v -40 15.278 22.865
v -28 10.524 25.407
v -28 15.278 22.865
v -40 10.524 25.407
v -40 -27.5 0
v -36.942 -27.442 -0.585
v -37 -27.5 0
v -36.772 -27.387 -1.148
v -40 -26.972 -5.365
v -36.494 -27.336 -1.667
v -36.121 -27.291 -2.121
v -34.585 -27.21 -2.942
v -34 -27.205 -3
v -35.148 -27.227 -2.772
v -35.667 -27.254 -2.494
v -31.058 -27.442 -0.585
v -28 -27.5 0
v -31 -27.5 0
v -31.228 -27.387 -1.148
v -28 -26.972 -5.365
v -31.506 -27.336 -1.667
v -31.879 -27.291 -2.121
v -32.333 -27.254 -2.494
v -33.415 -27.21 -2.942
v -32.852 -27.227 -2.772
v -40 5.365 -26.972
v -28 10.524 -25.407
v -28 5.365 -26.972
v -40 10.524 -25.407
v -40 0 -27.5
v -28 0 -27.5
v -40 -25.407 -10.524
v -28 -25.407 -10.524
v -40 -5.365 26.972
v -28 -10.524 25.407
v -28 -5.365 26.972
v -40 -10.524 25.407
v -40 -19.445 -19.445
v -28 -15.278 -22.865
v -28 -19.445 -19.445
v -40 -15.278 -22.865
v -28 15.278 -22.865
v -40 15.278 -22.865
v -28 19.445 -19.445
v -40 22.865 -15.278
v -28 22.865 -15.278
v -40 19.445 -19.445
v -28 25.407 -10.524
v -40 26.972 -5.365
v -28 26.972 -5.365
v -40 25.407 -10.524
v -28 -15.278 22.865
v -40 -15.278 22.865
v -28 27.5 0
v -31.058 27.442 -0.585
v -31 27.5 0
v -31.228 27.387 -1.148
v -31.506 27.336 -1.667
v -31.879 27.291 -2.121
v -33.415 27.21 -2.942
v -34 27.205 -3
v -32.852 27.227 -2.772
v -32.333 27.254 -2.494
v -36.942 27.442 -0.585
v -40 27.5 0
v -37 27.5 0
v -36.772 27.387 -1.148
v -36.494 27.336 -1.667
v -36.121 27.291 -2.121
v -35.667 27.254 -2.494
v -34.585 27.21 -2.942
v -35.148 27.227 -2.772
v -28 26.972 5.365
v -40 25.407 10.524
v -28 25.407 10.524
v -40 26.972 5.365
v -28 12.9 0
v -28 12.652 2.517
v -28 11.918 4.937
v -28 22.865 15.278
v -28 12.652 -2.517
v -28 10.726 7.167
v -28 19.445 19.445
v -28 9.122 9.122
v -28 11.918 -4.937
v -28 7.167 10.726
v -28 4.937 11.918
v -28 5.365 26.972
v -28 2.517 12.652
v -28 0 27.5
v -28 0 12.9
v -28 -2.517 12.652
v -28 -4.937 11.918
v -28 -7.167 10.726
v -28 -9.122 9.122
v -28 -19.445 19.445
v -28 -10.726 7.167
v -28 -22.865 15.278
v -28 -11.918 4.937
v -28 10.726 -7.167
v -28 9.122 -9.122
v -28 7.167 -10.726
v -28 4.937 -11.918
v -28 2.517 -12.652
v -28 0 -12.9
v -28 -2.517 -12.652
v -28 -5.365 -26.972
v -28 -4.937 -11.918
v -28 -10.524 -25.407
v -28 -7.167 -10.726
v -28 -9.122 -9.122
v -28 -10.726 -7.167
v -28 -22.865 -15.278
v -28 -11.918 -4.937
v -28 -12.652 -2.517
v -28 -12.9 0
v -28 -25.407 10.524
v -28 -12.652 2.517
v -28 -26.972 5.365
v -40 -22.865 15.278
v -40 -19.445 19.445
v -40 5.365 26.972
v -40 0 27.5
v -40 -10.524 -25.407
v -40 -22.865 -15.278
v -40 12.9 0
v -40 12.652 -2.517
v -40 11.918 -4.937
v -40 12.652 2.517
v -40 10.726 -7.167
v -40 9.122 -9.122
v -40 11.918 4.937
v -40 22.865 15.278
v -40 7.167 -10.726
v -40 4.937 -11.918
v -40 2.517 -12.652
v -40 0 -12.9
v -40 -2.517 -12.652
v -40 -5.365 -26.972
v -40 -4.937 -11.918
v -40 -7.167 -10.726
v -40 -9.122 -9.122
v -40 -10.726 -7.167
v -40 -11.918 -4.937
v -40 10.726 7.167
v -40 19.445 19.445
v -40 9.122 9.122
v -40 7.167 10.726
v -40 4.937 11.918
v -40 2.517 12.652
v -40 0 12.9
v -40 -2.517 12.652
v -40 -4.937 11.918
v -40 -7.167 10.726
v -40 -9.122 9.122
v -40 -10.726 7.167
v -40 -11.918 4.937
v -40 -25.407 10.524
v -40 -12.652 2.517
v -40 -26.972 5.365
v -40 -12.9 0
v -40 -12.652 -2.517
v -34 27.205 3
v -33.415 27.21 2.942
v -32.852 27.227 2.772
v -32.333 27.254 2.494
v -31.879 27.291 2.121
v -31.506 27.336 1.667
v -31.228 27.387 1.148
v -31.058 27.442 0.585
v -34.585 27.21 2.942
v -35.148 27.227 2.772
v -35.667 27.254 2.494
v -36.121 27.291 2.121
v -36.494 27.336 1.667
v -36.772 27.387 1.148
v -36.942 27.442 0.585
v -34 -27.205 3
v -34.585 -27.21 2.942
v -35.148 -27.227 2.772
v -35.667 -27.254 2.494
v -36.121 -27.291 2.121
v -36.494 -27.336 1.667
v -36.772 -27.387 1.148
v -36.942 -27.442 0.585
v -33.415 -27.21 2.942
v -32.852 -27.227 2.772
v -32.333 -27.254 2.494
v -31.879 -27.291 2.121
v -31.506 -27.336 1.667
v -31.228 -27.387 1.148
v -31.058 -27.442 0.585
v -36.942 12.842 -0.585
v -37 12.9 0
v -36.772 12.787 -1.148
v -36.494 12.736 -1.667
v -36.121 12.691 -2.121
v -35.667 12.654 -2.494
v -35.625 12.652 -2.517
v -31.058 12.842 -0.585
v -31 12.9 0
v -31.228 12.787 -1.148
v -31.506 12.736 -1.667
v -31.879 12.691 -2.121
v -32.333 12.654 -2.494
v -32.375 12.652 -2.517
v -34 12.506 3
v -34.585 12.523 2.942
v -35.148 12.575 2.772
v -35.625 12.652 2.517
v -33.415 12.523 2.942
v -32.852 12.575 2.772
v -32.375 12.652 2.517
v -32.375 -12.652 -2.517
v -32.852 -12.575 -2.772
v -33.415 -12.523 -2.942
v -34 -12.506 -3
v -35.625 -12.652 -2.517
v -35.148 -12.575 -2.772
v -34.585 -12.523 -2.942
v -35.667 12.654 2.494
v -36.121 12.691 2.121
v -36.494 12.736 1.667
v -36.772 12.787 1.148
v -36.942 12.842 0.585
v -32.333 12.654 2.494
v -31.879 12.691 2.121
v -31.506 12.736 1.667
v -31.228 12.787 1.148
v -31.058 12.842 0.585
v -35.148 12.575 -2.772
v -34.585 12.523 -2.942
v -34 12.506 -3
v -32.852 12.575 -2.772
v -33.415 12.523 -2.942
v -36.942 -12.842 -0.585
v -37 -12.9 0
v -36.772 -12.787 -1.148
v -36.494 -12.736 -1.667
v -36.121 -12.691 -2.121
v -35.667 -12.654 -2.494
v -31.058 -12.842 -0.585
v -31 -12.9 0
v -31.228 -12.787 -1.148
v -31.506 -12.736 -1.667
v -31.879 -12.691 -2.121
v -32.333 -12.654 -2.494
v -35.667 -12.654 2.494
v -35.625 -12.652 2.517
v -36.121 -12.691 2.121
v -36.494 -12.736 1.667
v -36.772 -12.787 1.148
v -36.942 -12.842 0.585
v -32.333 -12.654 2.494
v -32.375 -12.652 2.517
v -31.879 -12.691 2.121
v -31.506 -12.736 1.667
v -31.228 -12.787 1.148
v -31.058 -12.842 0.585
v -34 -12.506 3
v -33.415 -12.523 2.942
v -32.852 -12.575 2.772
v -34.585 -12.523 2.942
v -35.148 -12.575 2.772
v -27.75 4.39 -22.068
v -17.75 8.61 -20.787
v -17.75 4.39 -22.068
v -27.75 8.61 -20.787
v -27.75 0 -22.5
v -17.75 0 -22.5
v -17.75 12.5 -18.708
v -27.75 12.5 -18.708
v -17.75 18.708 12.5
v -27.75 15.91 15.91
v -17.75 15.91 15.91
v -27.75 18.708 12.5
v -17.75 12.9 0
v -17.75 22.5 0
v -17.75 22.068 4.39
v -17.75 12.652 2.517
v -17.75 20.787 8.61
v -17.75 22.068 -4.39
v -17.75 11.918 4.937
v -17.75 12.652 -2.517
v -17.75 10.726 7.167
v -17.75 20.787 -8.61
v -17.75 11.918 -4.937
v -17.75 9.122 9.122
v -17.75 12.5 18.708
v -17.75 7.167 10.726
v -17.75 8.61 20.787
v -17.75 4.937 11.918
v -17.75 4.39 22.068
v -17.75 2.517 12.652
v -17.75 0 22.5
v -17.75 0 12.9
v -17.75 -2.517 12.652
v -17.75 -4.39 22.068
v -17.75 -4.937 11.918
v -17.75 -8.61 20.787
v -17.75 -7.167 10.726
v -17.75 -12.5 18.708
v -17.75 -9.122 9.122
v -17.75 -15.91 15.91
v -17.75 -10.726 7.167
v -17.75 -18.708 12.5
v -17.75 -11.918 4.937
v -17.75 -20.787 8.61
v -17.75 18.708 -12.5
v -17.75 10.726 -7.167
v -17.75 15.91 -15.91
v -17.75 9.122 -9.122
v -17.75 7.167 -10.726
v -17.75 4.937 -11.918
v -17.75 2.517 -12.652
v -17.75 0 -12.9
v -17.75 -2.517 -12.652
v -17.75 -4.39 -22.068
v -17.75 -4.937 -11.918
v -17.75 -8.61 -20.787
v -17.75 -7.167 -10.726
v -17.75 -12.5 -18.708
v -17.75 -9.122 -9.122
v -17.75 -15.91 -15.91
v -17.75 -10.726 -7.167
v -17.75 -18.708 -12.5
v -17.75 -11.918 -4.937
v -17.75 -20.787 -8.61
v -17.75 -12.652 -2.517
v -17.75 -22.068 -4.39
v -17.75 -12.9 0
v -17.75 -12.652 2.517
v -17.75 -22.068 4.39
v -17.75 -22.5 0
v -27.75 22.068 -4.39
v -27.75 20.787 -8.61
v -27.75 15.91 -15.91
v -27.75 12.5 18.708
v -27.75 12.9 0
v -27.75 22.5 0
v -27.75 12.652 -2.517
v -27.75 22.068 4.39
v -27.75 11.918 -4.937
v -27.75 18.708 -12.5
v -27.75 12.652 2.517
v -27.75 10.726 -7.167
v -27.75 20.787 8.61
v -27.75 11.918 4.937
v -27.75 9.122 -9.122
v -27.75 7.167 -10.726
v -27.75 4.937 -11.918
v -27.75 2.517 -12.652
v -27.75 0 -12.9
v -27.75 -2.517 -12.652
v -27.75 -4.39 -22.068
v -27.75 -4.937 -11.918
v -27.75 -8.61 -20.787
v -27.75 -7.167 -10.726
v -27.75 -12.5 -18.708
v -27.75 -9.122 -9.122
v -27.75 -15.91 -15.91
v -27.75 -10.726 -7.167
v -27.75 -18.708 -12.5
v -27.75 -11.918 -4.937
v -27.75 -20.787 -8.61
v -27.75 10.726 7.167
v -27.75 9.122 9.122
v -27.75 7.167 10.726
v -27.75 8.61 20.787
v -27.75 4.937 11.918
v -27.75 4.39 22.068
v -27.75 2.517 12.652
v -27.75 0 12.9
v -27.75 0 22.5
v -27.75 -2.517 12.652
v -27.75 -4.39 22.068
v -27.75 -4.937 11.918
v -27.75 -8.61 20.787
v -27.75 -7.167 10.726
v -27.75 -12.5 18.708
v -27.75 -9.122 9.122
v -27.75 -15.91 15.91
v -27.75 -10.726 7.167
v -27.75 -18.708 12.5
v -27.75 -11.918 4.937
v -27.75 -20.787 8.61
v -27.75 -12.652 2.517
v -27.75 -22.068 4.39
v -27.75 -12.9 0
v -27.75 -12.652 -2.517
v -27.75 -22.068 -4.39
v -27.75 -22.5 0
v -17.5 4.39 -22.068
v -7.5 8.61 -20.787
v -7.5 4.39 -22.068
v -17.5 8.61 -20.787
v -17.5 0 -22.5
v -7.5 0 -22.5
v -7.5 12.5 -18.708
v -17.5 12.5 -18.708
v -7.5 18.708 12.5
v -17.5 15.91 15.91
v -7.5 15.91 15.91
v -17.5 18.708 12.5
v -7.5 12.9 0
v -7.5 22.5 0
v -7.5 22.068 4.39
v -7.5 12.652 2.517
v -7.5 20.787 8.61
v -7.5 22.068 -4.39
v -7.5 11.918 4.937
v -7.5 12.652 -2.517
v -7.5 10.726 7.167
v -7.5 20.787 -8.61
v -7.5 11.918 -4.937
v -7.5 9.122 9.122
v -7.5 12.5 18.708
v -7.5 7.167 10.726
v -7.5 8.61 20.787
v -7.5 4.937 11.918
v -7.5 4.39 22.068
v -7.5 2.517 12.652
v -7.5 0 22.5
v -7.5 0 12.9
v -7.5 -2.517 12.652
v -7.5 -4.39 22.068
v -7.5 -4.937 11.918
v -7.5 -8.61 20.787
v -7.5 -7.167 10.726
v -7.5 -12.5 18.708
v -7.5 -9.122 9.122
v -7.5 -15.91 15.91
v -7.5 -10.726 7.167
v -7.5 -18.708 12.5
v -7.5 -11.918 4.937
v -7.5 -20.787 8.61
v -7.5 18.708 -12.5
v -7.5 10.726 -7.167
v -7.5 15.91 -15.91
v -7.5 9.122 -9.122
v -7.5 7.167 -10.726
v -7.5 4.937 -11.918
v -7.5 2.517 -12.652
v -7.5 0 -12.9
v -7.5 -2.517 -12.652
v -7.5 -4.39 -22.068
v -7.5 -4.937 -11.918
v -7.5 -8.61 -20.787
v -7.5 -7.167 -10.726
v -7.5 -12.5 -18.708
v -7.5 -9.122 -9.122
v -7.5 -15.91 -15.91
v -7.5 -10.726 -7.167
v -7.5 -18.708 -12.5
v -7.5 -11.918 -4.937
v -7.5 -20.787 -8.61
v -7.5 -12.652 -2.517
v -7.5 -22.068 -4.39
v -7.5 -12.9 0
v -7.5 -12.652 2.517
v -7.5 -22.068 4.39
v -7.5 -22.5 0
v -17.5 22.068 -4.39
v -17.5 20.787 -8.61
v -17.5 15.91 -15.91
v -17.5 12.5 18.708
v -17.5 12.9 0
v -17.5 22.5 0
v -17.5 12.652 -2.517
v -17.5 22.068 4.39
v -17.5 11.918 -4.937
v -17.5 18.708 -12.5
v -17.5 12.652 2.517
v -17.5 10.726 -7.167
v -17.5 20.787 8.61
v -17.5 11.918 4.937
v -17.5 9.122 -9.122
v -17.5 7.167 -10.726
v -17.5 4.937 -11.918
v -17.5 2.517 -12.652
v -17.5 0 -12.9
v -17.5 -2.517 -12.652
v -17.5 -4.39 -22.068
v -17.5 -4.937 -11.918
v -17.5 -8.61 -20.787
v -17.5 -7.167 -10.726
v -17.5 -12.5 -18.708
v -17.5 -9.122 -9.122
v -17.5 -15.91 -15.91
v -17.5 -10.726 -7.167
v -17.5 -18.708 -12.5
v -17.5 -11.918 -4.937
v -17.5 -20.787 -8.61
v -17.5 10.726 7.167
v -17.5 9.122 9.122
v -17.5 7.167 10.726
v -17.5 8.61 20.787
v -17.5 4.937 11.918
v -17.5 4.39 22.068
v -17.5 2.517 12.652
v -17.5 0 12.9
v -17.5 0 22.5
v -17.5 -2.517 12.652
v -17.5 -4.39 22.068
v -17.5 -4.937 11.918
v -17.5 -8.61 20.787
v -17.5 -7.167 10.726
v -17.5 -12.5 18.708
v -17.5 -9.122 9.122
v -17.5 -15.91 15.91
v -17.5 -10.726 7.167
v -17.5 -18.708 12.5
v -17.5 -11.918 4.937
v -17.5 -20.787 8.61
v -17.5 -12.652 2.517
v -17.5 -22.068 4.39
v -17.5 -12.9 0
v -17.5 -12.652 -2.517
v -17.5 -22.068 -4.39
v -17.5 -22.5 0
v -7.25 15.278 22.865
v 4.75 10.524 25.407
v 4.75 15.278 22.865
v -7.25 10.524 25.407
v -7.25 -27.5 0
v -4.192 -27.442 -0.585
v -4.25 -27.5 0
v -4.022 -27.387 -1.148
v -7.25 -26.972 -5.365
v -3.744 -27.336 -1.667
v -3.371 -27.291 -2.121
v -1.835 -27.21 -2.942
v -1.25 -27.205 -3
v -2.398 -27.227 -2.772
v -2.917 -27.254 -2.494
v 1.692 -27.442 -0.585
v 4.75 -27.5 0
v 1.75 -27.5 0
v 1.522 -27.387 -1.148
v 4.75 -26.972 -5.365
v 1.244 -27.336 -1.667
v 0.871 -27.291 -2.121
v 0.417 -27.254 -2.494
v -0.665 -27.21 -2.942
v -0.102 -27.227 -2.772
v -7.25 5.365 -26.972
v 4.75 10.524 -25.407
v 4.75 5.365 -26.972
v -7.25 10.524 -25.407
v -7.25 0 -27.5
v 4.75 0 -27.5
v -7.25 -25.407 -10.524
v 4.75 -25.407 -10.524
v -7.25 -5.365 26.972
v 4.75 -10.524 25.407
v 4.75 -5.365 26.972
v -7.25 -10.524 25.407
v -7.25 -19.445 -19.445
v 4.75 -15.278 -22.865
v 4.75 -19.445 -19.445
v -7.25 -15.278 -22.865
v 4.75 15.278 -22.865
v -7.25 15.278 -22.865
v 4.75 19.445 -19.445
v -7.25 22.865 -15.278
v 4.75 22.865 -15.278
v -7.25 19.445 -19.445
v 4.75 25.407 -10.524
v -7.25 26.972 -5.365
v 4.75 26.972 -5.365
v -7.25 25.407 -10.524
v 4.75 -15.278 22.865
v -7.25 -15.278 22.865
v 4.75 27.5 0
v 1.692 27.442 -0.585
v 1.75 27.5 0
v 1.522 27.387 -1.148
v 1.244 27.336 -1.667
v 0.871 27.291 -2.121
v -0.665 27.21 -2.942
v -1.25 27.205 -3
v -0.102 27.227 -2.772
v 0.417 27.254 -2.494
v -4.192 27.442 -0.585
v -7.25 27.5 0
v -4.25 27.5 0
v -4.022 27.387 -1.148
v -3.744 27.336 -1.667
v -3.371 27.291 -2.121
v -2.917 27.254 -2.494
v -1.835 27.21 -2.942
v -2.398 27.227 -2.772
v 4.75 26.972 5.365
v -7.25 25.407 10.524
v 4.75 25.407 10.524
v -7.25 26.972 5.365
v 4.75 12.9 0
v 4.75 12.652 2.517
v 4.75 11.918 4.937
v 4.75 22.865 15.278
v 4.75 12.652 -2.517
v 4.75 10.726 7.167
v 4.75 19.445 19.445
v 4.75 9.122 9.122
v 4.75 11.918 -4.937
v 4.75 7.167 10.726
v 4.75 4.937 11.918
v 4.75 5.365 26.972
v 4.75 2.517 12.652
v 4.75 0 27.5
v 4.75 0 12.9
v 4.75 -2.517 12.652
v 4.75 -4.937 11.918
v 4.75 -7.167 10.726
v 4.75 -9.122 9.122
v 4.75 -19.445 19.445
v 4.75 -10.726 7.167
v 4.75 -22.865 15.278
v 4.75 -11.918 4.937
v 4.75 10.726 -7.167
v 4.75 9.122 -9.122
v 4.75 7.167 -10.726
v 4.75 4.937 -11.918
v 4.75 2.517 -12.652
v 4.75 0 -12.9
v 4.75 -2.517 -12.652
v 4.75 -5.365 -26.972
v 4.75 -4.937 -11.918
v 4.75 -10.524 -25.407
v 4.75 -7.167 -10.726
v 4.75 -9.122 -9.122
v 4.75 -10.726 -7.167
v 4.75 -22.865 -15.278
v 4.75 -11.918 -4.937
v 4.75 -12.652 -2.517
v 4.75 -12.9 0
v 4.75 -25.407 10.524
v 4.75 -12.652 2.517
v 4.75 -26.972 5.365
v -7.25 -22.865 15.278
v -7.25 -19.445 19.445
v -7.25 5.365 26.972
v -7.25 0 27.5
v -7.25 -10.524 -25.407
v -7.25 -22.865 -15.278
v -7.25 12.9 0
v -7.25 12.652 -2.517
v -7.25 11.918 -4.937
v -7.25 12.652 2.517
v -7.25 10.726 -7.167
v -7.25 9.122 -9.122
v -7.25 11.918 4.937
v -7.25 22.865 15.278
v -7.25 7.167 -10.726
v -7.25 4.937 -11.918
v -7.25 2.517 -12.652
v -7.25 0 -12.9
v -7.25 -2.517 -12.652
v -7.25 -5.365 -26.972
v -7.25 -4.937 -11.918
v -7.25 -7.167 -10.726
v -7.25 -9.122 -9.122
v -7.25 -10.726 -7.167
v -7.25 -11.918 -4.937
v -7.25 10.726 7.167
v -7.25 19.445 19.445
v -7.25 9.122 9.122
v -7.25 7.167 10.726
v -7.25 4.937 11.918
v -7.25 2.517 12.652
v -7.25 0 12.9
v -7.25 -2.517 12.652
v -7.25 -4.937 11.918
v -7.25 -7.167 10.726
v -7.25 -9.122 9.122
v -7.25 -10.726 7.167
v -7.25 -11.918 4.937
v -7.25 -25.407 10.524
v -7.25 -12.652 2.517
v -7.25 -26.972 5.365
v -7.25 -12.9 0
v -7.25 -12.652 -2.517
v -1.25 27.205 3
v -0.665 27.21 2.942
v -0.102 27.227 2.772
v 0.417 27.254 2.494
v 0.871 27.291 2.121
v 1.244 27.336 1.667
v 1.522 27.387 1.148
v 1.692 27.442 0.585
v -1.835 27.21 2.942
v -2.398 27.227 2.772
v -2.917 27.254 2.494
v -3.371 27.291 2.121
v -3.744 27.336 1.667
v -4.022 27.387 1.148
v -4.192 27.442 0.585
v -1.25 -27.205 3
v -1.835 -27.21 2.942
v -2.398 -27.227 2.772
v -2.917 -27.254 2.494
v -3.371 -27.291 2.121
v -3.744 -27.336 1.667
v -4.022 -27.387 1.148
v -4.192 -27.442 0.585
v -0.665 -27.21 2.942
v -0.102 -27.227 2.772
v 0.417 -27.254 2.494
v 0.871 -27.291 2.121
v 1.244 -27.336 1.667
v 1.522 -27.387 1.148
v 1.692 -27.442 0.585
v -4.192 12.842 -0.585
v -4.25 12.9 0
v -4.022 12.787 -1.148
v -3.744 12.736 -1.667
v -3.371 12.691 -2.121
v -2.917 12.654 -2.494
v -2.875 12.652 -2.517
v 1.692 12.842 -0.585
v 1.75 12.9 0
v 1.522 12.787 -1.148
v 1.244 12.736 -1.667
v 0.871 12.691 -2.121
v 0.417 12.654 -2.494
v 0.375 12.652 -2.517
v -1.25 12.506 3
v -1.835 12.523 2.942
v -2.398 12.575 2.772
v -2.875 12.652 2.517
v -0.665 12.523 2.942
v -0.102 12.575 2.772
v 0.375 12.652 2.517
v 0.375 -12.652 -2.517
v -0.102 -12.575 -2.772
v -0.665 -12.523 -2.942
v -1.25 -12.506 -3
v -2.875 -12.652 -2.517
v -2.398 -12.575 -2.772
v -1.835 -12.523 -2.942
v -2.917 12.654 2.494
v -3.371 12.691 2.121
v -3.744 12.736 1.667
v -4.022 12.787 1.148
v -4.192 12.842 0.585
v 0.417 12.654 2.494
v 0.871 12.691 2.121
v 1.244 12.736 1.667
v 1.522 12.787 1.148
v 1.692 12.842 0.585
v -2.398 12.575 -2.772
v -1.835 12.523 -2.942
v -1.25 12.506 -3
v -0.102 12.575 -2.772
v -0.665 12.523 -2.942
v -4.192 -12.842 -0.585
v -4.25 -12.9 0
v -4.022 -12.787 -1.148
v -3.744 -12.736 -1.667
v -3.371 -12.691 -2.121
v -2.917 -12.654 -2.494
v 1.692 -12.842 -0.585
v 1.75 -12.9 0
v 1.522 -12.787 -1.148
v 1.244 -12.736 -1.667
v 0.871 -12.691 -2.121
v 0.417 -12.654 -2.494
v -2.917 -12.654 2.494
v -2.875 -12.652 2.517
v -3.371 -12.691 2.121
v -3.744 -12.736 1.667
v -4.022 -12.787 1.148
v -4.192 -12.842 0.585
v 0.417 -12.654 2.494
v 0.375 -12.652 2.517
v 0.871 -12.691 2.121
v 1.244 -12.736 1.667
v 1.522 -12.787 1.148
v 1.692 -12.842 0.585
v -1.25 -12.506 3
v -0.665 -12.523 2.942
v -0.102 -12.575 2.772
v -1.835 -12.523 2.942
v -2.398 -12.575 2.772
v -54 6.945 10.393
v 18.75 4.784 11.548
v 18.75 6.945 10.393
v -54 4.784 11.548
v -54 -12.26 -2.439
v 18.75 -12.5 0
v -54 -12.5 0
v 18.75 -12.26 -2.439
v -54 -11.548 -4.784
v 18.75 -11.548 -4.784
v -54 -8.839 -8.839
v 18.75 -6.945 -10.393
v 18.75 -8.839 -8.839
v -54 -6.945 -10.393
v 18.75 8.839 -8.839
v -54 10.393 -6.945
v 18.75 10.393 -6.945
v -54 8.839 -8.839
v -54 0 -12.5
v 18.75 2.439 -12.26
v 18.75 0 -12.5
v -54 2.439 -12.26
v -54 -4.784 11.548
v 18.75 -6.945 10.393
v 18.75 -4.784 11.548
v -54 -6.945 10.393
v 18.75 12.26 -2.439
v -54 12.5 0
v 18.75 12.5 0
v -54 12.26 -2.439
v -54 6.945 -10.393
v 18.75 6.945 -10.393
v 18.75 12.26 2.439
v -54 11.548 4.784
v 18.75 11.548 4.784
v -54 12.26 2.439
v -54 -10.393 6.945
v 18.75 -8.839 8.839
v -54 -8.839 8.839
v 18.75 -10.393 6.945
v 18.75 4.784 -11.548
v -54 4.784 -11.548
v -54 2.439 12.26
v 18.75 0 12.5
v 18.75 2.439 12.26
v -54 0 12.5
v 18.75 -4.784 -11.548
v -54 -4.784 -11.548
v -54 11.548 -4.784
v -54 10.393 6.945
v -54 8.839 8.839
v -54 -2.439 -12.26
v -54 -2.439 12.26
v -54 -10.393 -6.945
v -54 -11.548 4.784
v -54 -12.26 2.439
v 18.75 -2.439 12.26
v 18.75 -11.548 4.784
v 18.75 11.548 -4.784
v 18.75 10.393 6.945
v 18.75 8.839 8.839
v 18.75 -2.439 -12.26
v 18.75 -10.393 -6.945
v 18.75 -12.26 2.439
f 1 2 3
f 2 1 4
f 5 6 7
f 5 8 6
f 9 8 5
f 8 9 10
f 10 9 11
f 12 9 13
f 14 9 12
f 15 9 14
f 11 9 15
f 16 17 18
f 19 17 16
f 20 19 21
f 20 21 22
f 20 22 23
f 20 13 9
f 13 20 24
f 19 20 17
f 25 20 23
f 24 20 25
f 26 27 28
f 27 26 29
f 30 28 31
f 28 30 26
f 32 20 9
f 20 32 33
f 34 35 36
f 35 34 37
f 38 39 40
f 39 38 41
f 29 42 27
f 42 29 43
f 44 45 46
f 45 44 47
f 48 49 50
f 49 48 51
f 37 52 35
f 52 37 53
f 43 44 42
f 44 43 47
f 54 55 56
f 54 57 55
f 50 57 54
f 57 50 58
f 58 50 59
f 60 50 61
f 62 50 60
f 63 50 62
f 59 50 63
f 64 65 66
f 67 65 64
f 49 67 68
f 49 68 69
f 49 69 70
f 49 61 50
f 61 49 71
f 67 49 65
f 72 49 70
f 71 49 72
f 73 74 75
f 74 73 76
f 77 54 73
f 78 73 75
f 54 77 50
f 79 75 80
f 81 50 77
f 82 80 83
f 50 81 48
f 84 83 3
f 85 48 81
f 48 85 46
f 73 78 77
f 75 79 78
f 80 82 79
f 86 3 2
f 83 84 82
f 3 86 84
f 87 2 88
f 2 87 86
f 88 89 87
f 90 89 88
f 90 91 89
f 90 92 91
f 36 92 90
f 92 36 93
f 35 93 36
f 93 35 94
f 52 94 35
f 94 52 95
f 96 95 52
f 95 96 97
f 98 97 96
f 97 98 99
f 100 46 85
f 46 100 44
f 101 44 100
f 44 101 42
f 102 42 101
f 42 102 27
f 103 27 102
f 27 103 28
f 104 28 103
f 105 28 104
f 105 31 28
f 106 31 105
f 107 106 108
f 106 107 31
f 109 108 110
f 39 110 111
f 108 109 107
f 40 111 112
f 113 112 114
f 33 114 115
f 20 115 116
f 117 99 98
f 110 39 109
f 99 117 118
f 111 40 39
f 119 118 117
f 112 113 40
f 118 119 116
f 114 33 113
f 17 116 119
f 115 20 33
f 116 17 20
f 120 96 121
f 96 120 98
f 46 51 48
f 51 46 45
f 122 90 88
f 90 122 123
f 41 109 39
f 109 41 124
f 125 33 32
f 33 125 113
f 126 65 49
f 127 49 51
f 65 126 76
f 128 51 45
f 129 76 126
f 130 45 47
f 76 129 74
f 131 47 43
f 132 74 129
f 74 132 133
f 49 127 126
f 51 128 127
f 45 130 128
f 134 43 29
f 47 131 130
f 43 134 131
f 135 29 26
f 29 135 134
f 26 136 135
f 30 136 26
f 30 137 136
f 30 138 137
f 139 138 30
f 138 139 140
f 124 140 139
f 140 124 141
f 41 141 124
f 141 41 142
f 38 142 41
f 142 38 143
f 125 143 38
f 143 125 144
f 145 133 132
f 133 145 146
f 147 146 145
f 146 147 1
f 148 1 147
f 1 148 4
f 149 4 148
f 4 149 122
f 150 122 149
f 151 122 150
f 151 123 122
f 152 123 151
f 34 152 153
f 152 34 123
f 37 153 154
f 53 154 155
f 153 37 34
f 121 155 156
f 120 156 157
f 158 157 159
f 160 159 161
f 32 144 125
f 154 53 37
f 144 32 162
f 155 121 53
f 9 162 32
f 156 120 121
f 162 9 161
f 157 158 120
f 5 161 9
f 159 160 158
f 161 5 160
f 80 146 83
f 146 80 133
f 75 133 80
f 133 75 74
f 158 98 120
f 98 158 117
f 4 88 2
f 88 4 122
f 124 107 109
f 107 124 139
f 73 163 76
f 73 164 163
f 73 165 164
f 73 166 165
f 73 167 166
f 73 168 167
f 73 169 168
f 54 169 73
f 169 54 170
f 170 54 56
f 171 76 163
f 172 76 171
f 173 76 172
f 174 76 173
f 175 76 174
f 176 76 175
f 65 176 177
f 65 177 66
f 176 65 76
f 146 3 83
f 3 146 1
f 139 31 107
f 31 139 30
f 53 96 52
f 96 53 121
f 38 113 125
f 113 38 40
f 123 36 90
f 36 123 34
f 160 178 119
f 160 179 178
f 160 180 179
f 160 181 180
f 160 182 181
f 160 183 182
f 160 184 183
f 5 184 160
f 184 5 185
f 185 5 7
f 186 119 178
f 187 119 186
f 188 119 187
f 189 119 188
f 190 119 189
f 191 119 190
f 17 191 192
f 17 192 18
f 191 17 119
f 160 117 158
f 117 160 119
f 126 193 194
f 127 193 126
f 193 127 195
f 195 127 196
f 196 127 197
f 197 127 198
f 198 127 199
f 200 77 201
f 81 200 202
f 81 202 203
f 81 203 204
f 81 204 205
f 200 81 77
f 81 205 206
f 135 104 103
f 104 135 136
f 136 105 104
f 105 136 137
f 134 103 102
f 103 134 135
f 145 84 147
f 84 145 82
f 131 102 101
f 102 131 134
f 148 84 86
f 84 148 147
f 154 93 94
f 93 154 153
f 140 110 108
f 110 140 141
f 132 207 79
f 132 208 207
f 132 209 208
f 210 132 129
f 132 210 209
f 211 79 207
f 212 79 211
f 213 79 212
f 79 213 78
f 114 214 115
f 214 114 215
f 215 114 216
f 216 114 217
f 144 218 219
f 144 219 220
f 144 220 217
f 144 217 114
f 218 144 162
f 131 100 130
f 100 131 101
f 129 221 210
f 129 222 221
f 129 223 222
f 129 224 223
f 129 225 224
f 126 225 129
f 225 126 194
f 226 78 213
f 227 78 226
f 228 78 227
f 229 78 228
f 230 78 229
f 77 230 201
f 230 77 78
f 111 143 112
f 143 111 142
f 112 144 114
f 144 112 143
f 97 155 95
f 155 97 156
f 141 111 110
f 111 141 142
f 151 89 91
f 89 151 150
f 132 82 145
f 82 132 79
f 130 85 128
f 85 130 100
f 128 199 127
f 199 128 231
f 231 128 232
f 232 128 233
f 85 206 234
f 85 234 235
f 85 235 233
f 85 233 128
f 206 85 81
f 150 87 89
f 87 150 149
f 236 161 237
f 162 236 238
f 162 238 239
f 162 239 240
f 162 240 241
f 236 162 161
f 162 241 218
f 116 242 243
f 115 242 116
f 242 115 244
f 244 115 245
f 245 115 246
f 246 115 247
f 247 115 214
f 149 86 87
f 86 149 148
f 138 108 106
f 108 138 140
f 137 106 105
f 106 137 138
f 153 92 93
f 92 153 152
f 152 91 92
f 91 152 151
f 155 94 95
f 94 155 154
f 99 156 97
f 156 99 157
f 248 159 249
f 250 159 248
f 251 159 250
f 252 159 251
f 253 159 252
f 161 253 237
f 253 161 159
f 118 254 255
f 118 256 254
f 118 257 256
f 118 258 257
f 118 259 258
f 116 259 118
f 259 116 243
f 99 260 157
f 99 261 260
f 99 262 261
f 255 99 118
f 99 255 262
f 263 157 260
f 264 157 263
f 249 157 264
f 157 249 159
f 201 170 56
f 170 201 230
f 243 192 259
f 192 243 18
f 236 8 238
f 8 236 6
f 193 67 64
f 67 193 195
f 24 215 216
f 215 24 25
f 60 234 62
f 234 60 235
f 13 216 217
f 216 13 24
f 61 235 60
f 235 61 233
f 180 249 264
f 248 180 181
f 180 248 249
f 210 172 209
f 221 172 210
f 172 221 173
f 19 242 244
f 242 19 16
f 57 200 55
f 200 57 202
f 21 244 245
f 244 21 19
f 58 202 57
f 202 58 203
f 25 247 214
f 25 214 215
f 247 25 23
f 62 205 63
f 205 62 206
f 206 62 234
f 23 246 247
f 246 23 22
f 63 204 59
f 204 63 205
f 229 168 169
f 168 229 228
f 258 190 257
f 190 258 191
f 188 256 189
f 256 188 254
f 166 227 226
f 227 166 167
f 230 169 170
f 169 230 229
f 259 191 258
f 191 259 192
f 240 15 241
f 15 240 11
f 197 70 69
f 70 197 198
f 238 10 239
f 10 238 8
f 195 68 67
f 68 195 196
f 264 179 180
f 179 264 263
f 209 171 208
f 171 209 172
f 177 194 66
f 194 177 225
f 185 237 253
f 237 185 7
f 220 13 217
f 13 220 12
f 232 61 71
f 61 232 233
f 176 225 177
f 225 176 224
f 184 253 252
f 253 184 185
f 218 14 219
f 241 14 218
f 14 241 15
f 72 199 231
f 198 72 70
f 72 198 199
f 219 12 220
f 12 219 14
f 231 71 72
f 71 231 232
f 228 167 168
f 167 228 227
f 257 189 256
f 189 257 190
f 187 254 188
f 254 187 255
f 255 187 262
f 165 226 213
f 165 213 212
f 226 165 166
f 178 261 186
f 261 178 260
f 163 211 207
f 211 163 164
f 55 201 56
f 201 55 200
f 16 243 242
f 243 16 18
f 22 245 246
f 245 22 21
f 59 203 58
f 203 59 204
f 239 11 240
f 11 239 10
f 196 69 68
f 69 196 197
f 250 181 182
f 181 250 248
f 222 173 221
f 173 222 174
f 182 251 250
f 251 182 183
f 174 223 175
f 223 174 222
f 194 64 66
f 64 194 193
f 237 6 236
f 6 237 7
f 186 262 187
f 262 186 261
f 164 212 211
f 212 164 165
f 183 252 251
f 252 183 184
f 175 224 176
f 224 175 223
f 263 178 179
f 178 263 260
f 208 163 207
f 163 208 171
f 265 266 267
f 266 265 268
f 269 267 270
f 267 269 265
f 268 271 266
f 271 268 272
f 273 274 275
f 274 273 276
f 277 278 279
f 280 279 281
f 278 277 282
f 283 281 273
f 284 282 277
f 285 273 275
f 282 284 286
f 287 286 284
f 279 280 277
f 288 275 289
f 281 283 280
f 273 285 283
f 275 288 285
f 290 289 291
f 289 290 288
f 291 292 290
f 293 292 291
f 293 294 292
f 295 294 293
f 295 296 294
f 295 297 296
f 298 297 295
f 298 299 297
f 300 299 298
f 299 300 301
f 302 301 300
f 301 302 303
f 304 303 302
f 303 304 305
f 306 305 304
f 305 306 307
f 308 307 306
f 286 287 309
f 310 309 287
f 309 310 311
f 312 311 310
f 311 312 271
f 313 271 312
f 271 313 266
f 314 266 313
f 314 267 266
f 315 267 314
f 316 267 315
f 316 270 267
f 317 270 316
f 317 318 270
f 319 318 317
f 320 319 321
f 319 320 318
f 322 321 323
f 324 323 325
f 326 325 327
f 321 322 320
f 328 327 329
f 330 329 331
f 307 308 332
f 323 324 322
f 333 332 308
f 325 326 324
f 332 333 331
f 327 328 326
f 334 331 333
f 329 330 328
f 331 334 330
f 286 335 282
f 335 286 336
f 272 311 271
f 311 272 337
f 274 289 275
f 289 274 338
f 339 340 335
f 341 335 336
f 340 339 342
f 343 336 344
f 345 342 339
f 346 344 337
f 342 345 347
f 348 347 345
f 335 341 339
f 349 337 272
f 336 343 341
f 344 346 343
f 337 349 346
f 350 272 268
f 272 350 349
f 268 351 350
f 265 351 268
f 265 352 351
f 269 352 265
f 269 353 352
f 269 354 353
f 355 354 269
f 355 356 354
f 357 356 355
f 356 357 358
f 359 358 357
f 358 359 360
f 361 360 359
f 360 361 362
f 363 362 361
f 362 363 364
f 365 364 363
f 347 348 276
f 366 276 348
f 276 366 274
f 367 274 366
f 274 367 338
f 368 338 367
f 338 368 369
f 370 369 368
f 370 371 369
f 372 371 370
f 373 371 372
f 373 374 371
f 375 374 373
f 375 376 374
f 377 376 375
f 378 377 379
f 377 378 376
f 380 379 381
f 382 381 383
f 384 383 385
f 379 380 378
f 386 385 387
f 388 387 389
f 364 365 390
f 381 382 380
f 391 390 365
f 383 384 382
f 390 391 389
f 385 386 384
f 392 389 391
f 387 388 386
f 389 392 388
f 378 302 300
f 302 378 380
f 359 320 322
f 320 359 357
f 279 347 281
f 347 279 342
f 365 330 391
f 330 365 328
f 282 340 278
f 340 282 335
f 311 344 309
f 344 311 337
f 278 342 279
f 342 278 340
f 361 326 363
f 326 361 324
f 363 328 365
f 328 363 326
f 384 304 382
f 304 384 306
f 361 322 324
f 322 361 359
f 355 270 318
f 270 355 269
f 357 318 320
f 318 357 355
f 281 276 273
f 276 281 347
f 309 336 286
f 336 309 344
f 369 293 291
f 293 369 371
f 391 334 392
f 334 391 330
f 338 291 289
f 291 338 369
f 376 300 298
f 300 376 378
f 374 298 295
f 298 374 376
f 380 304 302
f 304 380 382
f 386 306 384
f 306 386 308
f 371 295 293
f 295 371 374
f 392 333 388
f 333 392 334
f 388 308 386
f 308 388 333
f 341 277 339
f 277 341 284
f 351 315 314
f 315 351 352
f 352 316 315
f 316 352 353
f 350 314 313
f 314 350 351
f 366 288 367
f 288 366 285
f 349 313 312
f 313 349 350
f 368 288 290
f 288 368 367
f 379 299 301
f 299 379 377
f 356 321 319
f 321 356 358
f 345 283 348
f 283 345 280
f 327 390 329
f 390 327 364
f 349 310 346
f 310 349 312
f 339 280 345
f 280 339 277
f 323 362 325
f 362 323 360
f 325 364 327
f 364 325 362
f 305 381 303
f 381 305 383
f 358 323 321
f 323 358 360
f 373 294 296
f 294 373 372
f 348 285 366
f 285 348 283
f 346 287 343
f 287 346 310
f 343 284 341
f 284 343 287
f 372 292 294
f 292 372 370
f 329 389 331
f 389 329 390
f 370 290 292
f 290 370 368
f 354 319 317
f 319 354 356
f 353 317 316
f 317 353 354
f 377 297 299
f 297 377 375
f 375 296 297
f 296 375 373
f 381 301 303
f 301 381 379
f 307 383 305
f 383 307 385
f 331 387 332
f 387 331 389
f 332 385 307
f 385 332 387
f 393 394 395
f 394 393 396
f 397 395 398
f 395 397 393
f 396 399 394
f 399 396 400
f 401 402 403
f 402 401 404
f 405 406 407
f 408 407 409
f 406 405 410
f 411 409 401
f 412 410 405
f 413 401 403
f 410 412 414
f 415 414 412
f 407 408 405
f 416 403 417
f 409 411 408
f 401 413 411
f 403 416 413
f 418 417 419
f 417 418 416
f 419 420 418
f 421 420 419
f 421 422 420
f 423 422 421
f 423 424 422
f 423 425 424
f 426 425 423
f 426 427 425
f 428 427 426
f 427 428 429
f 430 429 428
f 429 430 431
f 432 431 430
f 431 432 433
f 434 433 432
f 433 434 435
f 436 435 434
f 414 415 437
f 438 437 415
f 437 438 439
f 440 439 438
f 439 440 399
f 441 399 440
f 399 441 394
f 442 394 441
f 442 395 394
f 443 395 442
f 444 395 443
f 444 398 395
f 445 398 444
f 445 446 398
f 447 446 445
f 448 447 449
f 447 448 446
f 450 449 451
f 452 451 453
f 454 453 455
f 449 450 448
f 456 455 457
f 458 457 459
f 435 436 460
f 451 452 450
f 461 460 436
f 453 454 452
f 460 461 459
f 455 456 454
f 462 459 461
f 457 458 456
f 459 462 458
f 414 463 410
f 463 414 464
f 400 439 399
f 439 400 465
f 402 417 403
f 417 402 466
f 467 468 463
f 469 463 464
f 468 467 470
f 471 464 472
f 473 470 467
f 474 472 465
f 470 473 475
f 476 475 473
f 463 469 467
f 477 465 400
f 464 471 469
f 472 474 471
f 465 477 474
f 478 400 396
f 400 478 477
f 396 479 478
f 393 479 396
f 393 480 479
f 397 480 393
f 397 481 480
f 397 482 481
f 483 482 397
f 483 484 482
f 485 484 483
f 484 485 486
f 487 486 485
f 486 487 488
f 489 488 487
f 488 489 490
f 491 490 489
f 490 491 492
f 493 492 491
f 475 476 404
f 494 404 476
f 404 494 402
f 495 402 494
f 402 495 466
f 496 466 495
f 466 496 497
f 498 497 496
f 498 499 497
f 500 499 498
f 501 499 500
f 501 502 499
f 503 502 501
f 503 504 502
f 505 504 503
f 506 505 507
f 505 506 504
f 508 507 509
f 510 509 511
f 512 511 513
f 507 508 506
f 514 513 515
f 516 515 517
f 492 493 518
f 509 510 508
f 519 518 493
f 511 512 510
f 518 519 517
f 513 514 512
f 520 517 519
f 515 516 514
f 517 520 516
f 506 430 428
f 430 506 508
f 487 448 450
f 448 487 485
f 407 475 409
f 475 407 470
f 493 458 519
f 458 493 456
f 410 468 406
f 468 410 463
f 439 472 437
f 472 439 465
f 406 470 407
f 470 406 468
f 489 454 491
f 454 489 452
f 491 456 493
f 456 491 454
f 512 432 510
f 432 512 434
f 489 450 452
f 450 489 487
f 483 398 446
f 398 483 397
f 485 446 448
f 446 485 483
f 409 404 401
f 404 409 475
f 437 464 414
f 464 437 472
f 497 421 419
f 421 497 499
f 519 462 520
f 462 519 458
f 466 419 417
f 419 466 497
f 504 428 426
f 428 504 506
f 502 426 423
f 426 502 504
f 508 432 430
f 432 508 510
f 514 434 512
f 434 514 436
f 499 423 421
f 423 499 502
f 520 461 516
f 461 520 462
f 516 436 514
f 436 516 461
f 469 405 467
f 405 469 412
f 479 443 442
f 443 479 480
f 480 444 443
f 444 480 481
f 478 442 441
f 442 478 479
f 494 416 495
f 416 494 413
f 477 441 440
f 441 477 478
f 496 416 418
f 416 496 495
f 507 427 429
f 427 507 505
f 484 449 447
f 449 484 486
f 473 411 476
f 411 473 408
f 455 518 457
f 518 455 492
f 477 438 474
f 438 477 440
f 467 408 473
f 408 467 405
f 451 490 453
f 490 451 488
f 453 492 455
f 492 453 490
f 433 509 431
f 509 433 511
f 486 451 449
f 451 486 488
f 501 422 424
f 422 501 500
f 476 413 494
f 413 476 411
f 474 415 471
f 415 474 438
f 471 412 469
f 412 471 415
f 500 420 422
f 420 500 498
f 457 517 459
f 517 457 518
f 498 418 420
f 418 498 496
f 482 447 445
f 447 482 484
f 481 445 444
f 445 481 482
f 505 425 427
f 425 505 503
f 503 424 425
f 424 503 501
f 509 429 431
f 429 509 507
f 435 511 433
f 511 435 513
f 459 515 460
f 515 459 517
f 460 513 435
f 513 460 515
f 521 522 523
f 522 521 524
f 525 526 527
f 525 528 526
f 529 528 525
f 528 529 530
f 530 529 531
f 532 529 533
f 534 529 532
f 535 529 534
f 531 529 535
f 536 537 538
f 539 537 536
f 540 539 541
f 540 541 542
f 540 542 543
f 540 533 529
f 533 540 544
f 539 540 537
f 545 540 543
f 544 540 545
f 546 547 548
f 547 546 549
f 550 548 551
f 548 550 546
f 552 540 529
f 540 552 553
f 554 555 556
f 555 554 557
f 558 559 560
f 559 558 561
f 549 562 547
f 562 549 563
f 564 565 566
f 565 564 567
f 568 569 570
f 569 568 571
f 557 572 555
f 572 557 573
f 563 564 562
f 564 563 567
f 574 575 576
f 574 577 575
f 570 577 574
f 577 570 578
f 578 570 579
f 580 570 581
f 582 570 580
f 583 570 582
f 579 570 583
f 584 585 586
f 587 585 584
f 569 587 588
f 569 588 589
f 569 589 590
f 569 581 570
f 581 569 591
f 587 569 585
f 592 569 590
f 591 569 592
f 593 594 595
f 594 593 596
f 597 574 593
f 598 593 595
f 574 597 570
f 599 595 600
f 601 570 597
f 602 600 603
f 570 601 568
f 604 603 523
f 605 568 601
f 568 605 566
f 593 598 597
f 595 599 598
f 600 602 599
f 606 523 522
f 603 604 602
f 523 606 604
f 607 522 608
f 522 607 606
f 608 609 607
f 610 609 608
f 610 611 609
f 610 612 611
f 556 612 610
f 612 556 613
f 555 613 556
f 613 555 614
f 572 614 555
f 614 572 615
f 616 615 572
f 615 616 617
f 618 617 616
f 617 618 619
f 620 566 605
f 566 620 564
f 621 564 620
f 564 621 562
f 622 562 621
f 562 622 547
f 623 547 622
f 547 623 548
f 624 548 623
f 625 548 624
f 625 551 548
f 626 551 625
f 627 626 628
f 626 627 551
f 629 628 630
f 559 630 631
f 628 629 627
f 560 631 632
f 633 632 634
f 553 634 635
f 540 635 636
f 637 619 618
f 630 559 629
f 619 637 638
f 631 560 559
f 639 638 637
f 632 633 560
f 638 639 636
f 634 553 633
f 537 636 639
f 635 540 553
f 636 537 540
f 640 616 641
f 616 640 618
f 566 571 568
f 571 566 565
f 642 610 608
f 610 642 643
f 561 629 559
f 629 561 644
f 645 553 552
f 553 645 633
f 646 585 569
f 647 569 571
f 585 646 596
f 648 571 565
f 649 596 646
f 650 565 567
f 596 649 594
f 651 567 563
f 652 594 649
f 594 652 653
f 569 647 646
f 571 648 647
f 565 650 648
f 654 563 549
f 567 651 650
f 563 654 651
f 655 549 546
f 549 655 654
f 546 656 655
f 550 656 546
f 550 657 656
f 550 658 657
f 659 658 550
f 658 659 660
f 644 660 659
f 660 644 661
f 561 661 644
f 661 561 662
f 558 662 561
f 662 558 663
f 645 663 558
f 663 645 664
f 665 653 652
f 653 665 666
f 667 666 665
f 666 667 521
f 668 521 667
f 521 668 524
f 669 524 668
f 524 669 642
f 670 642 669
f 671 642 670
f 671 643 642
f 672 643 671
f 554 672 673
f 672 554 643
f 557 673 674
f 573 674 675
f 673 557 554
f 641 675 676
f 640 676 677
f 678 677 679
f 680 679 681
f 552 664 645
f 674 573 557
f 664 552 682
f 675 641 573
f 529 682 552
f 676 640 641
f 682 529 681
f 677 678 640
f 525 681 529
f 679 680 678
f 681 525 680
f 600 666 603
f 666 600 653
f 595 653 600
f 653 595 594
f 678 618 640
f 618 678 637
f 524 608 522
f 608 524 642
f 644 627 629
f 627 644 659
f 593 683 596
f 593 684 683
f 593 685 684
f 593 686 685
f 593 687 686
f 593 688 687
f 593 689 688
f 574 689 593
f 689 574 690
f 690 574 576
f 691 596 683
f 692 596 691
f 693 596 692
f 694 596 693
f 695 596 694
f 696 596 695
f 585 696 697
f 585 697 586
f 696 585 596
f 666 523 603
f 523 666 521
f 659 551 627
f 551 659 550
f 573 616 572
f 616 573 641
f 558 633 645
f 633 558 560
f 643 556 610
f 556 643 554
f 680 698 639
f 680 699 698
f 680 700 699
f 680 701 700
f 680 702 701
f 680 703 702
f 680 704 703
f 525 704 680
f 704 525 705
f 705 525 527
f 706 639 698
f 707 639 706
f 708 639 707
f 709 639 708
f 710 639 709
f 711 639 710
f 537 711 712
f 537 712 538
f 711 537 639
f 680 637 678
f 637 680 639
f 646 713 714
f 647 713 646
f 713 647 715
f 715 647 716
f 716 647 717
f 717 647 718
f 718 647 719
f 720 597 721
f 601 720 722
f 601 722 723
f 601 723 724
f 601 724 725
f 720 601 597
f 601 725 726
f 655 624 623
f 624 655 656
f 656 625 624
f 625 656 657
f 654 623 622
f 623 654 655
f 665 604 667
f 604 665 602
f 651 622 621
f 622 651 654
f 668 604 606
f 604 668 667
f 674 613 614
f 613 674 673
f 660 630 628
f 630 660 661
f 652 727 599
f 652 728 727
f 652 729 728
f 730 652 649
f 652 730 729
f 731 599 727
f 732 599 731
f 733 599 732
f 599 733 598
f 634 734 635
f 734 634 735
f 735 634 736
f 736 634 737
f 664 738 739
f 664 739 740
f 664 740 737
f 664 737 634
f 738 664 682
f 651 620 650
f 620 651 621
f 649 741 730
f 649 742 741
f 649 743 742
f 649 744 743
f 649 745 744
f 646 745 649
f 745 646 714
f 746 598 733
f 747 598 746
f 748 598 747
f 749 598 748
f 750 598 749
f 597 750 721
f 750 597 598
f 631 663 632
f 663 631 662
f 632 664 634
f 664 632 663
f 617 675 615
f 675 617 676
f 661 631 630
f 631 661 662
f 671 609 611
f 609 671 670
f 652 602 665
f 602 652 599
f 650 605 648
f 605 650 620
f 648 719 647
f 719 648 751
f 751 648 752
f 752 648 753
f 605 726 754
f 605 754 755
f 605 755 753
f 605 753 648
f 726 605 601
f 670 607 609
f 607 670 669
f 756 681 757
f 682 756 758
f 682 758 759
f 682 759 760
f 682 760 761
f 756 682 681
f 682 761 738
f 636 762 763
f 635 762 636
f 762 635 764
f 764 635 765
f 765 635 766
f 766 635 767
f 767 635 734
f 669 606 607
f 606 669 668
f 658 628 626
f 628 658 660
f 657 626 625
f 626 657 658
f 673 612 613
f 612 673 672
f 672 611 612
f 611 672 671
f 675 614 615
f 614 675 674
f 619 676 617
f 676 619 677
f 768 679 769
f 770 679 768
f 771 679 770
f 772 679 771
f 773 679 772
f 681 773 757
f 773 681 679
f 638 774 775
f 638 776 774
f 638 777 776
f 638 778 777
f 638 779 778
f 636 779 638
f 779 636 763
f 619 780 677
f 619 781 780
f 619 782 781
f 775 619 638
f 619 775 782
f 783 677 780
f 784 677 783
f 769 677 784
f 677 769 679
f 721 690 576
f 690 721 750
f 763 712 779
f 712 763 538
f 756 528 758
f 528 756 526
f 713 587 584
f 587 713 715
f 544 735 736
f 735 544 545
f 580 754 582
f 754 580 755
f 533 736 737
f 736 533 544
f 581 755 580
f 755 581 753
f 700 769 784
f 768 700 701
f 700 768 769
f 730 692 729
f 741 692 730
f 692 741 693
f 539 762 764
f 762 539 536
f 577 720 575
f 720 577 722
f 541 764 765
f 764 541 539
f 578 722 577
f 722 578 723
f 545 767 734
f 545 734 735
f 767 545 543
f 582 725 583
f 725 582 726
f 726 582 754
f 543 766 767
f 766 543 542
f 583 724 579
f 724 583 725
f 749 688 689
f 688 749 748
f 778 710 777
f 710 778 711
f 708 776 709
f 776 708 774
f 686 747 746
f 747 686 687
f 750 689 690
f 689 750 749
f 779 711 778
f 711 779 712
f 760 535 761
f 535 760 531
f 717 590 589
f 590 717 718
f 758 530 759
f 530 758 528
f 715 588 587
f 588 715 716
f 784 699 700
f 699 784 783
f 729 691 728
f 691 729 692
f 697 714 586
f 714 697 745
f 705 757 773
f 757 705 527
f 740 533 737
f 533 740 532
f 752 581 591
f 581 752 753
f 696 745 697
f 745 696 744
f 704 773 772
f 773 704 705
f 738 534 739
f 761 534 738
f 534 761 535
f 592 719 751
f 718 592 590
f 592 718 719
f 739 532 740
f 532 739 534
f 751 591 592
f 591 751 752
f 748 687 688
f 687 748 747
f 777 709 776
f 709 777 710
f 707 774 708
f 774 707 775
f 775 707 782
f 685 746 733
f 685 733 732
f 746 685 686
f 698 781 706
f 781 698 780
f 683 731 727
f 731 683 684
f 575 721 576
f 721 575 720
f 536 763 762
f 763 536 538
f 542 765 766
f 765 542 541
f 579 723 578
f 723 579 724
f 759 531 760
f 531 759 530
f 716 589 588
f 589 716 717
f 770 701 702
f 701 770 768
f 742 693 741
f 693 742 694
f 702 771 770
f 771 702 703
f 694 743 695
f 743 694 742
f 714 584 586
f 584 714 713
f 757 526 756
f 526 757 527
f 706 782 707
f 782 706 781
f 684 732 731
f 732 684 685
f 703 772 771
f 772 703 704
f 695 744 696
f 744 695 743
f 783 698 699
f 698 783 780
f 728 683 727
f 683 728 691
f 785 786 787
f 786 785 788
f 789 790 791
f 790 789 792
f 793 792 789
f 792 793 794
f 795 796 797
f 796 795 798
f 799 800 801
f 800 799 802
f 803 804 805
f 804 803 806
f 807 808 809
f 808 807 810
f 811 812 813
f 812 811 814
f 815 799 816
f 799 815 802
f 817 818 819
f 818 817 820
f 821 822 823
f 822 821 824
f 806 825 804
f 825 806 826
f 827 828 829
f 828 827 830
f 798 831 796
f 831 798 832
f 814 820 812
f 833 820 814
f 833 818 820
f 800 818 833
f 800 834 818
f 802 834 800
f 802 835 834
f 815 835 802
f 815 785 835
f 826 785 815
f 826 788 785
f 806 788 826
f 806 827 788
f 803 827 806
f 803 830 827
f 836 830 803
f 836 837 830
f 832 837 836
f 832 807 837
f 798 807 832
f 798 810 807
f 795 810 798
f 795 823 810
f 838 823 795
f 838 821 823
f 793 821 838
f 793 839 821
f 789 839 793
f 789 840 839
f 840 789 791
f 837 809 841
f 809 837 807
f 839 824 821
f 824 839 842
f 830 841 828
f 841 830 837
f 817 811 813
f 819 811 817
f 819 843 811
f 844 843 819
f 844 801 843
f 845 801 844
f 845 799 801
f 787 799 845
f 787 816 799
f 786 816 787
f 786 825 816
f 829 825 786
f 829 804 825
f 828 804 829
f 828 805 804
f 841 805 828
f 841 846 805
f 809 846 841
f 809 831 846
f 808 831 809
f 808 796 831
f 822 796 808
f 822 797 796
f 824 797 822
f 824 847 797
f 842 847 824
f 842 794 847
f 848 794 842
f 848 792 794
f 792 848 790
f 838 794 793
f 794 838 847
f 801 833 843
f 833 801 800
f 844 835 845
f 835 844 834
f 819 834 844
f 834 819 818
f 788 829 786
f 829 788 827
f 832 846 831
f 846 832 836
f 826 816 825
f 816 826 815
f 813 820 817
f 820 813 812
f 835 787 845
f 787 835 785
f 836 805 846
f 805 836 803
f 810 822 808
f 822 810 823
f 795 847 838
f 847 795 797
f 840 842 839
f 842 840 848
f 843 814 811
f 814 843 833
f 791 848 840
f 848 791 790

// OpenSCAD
$fn = 32;

// ------------------------------------------------------------------------
// Shaft with rings and collars: d25 shaft, 4 rings
// Every part is its own module, assembly() places them once.
// ------------------------------------------------------------------------

// --- part 1 ---
module shaft() {
  translate([0, 0, -36.375]) cylinder(h = 72.75, d = 25);
}

// --- part 2 ---
module collar_a() {
  difference() {
    cylinder(h = 12, d = 55);
    translate([0, 0, -1]) cylinder(h = 14, d = 25.8);
    translate([0, 0, 6]) rotate([90, 0, 0]) cylinder(h = 57, d = 6, center = true);
  }
}

// --- part 3 ---
module spacer_a() {
  difference() {
      translate([0, 0, 0]) cylinder(h = 10, d = 45);
      translate([0, 0, -1]) cylinder(h = 12, d = 25.8);
    }
}

// --- part 4 ---
module spacer_b() {
  difference() {
      translate([0, 0, 0]) cylinder(h = 10, d = 45);
      translate([0, 0, -1]) cylinder(h = 12, d = 25.8);
    }
}

// --- part 5 ---
module collar_b() {
  difference() {
    cylinder(h = 12, d = 55);
    translate([0, 0, -1]) cylinder(h = 14, d = 25.8);
    translate([0, 0, 6]) rotate([90, 0, 0]) cylinder(h = 57, d = 6, center = true);
  }
}

// --- assembly ---
module assembly() {
  translate([-17.625, 0, 0]) rotate([0, 90, 0]) shaft();
  translate([-40, 0, 0]) rotate([0, 90, 0]) collar_a();
  translate([-27.75, 0, 0]) rotate([0, 90, 0]) spacer_a();
  translate([-17.5, 0, 0]) rotate([0, 90, 0]) spacer_b();
  translate([-7.25, 0, 0]) rotate([0, 90, 0]) collar_b();
}

assembly();
